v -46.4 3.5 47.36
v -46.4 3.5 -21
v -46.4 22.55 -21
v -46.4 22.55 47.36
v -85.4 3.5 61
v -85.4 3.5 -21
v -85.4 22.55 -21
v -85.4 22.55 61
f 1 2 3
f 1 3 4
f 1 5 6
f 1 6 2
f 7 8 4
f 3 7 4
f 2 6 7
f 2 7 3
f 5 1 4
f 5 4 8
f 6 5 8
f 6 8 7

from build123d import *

# Parameters (mm, degrees)
F0_R     = 11
F1_DEPTH = 3.5
F3_DEPTH = 19.05


with BuildPart() as f1:
    # F0 (on Front) → F1 (new body, symmetric)
    with BuildSketch(Plane.XZ):
        with BuildLine():
            ThreePointArc((32.332994, 19.822553), (28.916134, 20.703546), (25.4, 21))
            Line((25.4, 21), (-85.4, 21))
            Line((-85.4, 21), (-85.4, -21))
            Line((-85.4, -21), (25.4, -21))
            ThreePointArc((25.4, -21), (46.103546, -3.516134), (32.332994, 19.822553))
        make_face()
        with Locations((-25.4, 0)):
            Circle(F0_R, mode=Mode.SUBTRACT)
        with Locations((25.4, 0)):
            Circle(F0_R, mode=Mode.SUBTRACT)
        with BuildLine():
            Line((-85.4, 21), (25.4, 21))
            ThreePointArc((25.4, 21), (28.916134, 20.703546), (32.332994, 19.822553))
            Line((32.332994, 19.822553), (-85.4, 61))
            Line((-85.4, 61), (-85.4, 21))
        make_face()
    extrude(amount=F1_DEPTH, both=True)


with BuildPart() as f3:
    # F2 (on face) → F3 (new body)
    with BuildSketch(Plane.XZ.offset(3.5)):
        Polygon((-46.4, 47.35964), (-85.4, 61), (-85.4, -21), (-46.4, -21), align=None)
    extrude(amount=F3_DEPTH)


with BuildPart() as f4_1:
    # F4: instance of F3
    add(f3.part.mirror(Plane.XZ))


solid = f4_1.part
